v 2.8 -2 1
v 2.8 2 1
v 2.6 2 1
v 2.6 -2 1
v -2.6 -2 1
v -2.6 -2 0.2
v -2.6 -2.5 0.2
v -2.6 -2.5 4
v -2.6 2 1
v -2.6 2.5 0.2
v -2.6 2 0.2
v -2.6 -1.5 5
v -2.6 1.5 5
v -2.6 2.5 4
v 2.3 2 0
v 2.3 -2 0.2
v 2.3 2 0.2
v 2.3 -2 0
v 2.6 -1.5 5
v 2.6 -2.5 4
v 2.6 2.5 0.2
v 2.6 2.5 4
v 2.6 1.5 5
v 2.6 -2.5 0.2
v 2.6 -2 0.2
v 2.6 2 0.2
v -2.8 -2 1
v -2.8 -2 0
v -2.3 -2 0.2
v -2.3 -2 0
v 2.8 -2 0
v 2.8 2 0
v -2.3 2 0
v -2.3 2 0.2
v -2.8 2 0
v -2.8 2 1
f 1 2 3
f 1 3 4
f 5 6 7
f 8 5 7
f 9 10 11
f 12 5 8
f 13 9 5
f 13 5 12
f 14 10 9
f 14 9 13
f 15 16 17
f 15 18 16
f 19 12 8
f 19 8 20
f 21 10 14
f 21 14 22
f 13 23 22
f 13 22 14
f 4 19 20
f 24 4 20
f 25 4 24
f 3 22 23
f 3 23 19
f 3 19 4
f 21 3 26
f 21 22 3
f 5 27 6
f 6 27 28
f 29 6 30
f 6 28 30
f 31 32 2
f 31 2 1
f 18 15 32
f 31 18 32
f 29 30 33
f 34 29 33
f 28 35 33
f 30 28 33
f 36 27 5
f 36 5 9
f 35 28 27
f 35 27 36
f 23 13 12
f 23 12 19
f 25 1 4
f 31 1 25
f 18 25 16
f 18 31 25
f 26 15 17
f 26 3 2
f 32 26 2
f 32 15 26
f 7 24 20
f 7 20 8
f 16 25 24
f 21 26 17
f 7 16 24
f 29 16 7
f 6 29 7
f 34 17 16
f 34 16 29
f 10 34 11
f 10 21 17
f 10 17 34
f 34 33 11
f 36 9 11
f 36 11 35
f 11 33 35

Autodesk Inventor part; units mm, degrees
ref_plane "YZ Plane" through (0, 0, 0) normal (1, 0, 0) x (0, 1, 0)
ref_plane "XZ Plane" through (0, 0, 0) normal (0, 1, 0) x (-1, 0, 0)
ref_plane "XY Plane" through (0, 0, 0) normal (0, 0, 1) x (1, 0, 0)
sketch "Sketch1" plane through (0, 0, 0) normal (0, 0, 1) x (1, 0, 0)
  line L0 (-2.8, 2.5) -> (2.8, 2.5)
  line L1 (2.8, 2.5) -> (2.8, -2.5)
  line L2 (2.8, -2.5) -> (-2.8, -2.5)
  line L3 (-2.8, -2.5) -> (-2.8, 2.5)
  line L4 (-2.8, 2.5) -> (2.8, -2.5) construction
  line L5 (2.8, 2.5) -> (-2.8, -2.5) construction
  point P0 (0, 0)
  dimension "d0" = 5.6
  dimension "d1" = 5
extrude "Extrusion1" add sketch "Sketch1" along normal blind 5
chamfer "Chamfer1" distance 1 angle 45 2 edges at (0, -2.5, 5) (0, 2.5, 5)
sketch "Sketch2" plane through (2.8, -2.5, 0) normal (1, 0, 0) x (0, 0, -1)
  line L0 (-5, 4) -> (-4, 5) projected
  line L1 (-5, 1) -> (-5, 4) projected
  line L2 (-4, 0) -> (-5, 1) projected
  line L3 (0, 0) -> (-4, 0) projected
  line L4 (0, 5) -> (0, 0) projected
  line L5 (0, 5) -> (-4, 5) projected
  line L6 (-1, 0.5) -> (0, 0.5)
  line L7 (0, 0.5) -> (0, 4.5)
  line L8 (0, 4.5) -> (-1, 4.5)
  line L9 (-1, 4.5) -> (-1, 0.5)
  point P0 (0, 2.5)
  dimension "d7" = 0.5
  dimension "d8" = 0.5
  dimension "d9" = 1
extrude "Extrusion2" cut sketch "Sketch2" against normal blind 0.2 contours L0 L5 L4 L8 L9 L6 L3 L2 L1
mirror "Mirror1" about plane through (0, 0, 0) normal (1, 0, 0) of "Extrusion2"
sketch "Sketch3" plane through (0, 0, 0) normal (0, 0, -1) x (-1, 0, 0)
  line L0 (2.6, -2.5) -> (2.6, -2) projected
  line L1 (2.6, -2) -> (2.8, -2) projected
  line L2 (2.8, -2) -> (2.8, 2) projected
  line L3 (2.8, 2) -> (2.6, 2) projected
  line L4 (2.6, 2) -> (2.6, 2.5) projected
  line L5 (2.6, 2.5) -> (-2.6, 2.5) projected
  line L6 (-2.6, 2.5) -> (-2.6, 2) projected
  line L7 (-2.6, 2) -> (-2.8, 2) projected
  line L8 (-2.8, 2) -> (-2.8, -2) projected
  line L9 (-2.8, -2) -> (-2.6, -2) projected
  line L10 (-2.6, -2) -> (-2.6, -2.5) projected
  line L11 (-2.6, -2.5) -> (2.6, -2.5) projected
  line L12 (2.8, -2) -> (2.3, -2)
  line L13 (2.3, -2) -> (2.3, 2)
  line L14 (2.3, 2) -> (2.8, 2)
  line L15 (2.8, 2) -> (2.8, -2)
  line L16 (-2.8, -2) -> (-2.3, -2)
  line L17 (-2.3, -2) -> (-2.3, 2)
  line L18 (-2.3, 2) -> (-2.8, 2)
  line L19 (-2.8, 2) -> (-2.8, -2)
  point P0 (0, 0)
  dimension "d12" = 0.5
  dimension "d13" = 4
  dimension "d14" = 0.5
  dimension "d15" = 4
extrude "Extrusion3" cut sketch "Sketch3" against normal blind 0.2 contours L11 L10 L16 L17 L18 L6 L5 L4 L14 L13 L12 L0
equation "\"d14\" = d12"
equation "\"d15\" = d13"
properties part number "NL565050T-103J-PF"
